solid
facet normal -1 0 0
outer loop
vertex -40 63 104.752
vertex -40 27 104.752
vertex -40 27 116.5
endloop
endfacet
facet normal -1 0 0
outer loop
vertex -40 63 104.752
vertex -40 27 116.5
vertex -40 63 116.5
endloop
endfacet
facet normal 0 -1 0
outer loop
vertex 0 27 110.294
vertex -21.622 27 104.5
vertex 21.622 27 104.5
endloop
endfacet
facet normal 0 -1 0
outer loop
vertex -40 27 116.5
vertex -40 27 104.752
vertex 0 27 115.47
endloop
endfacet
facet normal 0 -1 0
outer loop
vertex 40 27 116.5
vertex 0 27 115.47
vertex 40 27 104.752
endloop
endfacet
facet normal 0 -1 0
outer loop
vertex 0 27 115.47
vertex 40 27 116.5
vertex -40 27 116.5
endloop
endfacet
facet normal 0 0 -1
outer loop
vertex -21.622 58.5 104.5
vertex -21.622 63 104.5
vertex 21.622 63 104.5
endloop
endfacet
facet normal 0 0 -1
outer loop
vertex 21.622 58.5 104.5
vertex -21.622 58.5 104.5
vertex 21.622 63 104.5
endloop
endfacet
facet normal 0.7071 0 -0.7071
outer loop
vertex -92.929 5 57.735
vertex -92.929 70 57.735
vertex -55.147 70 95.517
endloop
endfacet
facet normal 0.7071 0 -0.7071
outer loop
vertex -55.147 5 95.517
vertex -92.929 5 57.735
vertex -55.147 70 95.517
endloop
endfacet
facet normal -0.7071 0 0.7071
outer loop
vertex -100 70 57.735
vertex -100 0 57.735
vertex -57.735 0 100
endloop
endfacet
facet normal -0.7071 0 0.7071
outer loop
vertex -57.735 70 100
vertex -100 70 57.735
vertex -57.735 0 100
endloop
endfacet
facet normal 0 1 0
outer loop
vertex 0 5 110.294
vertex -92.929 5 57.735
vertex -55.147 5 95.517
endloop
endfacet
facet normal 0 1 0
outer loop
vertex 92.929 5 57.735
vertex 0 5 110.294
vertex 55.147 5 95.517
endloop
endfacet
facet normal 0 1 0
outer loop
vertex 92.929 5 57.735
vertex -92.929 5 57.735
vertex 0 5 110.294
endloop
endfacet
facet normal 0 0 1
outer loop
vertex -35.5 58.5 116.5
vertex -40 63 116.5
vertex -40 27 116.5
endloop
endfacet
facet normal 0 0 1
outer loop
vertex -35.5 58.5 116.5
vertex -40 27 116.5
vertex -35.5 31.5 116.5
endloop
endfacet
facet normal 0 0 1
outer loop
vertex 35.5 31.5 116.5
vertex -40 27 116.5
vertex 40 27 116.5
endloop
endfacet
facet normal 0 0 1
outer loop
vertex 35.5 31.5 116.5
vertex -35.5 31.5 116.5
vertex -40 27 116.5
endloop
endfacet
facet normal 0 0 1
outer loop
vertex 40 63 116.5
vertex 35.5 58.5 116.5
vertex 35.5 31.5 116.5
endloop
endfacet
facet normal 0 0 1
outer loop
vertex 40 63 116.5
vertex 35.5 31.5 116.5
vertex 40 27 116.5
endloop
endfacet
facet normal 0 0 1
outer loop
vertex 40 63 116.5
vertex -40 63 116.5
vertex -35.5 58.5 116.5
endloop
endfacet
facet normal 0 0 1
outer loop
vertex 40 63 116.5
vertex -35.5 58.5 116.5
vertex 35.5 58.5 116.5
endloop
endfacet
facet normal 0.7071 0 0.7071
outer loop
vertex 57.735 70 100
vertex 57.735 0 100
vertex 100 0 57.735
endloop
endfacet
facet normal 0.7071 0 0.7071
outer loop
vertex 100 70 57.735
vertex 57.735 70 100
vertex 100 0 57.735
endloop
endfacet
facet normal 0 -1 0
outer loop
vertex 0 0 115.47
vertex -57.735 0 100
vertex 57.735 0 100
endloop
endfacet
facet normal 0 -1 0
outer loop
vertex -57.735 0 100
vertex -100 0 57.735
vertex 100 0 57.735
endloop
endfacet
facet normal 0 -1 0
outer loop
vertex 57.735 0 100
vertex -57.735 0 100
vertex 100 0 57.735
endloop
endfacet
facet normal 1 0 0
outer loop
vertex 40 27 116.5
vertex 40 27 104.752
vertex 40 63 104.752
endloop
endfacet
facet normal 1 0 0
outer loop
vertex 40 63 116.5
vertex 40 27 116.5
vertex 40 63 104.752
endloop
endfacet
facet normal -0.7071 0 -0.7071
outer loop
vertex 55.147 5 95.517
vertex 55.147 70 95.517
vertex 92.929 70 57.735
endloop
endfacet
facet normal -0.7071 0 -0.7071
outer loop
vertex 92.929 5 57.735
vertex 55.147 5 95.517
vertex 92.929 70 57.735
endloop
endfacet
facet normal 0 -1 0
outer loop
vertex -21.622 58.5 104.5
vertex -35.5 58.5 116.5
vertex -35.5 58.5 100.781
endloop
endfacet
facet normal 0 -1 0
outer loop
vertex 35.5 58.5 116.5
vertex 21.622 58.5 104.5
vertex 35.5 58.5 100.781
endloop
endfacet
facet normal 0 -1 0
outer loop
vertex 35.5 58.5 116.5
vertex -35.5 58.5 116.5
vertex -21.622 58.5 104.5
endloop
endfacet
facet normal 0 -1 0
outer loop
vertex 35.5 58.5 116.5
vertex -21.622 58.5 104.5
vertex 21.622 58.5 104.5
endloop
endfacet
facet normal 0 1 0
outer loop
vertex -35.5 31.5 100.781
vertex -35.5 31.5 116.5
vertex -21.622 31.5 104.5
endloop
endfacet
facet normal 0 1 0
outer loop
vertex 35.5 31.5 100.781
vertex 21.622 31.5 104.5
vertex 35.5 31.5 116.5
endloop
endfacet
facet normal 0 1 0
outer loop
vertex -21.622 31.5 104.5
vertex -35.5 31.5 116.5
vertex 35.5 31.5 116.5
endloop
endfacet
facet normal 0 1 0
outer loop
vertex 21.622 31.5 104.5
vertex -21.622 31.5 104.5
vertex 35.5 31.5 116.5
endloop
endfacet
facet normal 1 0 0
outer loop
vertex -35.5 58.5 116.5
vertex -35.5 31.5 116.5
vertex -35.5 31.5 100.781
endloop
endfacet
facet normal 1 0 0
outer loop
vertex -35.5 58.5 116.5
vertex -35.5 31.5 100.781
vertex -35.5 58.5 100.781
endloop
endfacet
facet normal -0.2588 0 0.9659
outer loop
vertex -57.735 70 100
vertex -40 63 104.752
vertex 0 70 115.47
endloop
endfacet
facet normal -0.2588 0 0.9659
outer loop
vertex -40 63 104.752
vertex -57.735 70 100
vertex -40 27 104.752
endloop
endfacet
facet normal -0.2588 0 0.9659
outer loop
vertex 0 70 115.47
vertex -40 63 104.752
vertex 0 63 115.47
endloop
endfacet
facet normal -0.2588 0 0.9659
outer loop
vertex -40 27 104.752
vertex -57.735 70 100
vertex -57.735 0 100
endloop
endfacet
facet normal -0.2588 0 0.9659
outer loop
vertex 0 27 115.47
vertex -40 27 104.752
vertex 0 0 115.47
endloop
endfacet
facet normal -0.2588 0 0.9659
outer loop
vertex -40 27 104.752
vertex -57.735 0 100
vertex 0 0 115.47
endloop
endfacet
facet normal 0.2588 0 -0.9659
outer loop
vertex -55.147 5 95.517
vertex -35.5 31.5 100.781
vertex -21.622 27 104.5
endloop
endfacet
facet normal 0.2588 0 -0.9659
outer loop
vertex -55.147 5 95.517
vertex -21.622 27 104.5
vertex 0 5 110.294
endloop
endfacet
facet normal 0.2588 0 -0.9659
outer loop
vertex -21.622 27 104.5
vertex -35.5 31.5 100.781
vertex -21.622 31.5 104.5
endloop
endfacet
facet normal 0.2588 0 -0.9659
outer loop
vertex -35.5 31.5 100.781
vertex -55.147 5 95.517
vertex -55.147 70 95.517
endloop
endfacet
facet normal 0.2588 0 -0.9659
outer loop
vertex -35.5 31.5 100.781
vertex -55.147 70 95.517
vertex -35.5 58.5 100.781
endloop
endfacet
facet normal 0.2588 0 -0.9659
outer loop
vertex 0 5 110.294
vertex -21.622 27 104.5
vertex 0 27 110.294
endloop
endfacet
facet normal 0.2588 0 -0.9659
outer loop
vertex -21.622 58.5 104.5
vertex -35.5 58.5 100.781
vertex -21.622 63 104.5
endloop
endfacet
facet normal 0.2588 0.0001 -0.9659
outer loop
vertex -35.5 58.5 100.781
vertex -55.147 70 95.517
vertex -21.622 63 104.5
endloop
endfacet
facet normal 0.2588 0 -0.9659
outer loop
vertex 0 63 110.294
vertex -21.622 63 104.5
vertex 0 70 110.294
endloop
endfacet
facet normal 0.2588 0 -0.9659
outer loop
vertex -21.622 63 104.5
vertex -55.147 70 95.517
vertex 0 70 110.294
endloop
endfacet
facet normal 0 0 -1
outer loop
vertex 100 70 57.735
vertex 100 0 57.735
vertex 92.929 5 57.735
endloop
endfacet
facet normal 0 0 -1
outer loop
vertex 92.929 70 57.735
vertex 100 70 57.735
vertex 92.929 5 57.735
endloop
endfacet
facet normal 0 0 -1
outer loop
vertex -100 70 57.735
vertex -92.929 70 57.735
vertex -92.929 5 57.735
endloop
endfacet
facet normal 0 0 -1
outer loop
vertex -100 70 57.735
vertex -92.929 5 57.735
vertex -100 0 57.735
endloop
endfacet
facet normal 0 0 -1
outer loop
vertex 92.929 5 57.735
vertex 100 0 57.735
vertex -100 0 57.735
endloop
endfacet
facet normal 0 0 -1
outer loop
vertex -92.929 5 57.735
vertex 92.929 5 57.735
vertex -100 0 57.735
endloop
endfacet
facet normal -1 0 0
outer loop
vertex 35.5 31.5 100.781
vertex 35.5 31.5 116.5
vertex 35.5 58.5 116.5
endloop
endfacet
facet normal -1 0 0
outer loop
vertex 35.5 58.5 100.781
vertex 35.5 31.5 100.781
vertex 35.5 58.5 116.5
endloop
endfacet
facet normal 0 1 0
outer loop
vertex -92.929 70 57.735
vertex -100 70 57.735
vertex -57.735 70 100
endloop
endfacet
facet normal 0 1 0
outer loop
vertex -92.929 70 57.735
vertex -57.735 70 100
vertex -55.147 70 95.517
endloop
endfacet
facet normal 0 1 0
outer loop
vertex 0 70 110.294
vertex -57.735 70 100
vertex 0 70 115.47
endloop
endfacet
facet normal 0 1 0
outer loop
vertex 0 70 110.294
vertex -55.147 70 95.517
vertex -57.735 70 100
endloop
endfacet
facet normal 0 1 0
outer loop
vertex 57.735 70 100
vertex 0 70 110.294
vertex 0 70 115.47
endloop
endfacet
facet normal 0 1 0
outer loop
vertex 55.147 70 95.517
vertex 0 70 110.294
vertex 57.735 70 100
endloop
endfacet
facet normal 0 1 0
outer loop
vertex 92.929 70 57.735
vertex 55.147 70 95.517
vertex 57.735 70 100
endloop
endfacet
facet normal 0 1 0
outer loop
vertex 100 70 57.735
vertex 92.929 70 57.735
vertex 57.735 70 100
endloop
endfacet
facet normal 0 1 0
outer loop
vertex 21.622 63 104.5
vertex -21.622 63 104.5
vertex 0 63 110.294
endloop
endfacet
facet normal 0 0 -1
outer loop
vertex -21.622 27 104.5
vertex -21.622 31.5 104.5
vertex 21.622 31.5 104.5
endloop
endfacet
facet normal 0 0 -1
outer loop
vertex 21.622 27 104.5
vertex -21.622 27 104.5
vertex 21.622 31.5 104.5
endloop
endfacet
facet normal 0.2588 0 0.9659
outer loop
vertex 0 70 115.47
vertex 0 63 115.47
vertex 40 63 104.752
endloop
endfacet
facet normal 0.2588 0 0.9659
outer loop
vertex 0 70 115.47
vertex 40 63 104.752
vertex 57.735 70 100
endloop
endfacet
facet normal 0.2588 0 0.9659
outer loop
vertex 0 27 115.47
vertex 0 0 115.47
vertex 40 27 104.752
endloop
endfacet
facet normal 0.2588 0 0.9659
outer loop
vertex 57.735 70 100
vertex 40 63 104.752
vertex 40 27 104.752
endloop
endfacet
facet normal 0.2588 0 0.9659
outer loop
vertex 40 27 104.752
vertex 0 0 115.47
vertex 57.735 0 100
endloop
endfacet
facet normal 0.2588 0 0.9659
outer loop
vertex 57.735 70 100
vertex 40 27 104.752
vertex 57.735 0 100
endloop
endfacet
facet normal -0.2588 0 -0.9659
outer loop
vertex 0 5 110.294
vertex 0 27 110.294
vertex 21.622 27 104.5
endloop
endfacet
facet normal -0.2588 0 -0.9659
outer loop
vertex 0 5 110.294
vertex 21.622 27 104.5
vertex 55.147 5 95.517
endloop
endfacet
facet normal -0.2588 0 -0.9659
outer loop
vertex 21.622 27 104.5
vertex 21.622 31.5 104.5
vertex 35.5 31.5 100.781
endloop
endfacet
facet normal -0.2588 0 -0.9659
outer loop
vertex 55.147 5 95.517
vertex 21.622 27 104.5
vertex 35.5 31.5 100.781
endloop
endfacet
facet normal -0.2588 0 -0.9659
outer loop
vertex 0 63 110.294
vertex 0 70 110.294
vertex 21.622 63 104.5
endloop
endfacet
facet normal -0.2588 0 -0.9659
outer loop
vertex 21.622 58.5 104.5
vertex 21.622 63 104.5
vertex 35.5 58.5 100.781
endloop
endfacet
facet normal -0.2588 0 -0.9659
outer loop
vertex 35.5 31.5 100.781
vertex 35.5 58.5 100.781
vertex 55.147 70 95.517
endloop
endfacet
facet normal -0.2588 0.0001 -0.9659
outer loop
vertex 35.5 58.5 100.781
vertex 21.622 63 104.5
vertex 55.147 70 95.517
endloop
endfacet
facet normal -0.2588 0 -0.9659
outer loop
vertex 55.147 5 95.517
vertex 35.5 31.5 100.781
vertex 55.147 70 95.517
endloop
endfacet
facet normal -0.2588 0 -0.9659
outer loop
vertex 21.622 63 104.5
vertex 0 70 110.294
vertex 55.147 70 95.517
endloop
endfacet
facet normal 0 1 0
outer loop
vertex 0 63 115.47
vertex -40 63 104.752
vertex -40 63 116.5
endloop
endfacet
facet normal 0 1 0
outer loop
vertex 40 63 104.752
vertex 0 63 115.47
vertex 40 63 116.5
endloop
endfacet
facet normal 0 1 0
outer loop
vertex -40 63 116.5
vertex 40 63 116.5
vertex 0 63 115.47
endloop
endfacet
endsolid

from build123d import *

# Parameters (mm, degrees)
BOSS_EXTRUDE1_DEPTH = 70
CUT_EXTRUDE1_DEPTH  = 65
SKETCH6_W           = 80
SKETCH6_H           = 36
BOSS_EXTRUDE2_DEPTH = 12
SKETCH7_W           = 71
SKETCH7_H           = 27
CUT_EXTRUDE2_DEPTH  = 20


with BuildPart() as part:
    # Sketch1 → Boss-Extrude1 (new body)
    with BuildSketch(Plane(origin=(0, 0, 0), x_dir=(1, 0, 0), z_dir=(0, 1, 0))):
        Polygon((57.735026919, -100), (100, -57.735026919), (-100, -57.735026919), (-57.735026919, -100), (0, -115.470053838), align=None)
    extrude(amount=BOSS_EXTRUDE1_DEPTH)

    # Sketch4 → Cut-Extrude1 (cut)
    with BuildSketch(Plane(origin=(0, 70, 0), x_dir=(1, 0, 0), z_dir=(0, 1, 0))):
        Polygon((110.293672936, 0), (95.517122639, 55.146836468), (55.146836468, 95.517122639), (0, 110.293672936), (-55.146836468, 95.517122639), (-95.517122639, 55.146836468), (-110.293672936, 0), (-95.517122639, -55.146836468), (-55.146836468, -95.517122639), (0, -110.293672936), (55.146836468, -95.517122639), (95.517122639, -55.146836468), align=None)
    extrude(amount=-CUT_EXTRUDE1_DEPTH, mode=Mode.SUBTRACT)

    # Sketch6 → Boss-Extrude2 (add)
    with BuildSketch(Plane.XY.offset(104.5)):
        with Locations((0, 45)):
            Rectangle(SKETCH6_W, SKETCH6_H)
    extrude(amount=BOSS_EXTRUDE2_DEPTH)

    # Sketch7 → Cut-Extrude2 (cut)
    with BuildSketch(Plane.XY.offset(116.5)):
        with Locations((0, 45)):
            Rectangle(SKETCH7_W, SKETCH7_H)
    extrude(amount=-CUT_EXTRUDE2_DEPTH, mode=Mode.SUBTRACT)


solid = part.part
